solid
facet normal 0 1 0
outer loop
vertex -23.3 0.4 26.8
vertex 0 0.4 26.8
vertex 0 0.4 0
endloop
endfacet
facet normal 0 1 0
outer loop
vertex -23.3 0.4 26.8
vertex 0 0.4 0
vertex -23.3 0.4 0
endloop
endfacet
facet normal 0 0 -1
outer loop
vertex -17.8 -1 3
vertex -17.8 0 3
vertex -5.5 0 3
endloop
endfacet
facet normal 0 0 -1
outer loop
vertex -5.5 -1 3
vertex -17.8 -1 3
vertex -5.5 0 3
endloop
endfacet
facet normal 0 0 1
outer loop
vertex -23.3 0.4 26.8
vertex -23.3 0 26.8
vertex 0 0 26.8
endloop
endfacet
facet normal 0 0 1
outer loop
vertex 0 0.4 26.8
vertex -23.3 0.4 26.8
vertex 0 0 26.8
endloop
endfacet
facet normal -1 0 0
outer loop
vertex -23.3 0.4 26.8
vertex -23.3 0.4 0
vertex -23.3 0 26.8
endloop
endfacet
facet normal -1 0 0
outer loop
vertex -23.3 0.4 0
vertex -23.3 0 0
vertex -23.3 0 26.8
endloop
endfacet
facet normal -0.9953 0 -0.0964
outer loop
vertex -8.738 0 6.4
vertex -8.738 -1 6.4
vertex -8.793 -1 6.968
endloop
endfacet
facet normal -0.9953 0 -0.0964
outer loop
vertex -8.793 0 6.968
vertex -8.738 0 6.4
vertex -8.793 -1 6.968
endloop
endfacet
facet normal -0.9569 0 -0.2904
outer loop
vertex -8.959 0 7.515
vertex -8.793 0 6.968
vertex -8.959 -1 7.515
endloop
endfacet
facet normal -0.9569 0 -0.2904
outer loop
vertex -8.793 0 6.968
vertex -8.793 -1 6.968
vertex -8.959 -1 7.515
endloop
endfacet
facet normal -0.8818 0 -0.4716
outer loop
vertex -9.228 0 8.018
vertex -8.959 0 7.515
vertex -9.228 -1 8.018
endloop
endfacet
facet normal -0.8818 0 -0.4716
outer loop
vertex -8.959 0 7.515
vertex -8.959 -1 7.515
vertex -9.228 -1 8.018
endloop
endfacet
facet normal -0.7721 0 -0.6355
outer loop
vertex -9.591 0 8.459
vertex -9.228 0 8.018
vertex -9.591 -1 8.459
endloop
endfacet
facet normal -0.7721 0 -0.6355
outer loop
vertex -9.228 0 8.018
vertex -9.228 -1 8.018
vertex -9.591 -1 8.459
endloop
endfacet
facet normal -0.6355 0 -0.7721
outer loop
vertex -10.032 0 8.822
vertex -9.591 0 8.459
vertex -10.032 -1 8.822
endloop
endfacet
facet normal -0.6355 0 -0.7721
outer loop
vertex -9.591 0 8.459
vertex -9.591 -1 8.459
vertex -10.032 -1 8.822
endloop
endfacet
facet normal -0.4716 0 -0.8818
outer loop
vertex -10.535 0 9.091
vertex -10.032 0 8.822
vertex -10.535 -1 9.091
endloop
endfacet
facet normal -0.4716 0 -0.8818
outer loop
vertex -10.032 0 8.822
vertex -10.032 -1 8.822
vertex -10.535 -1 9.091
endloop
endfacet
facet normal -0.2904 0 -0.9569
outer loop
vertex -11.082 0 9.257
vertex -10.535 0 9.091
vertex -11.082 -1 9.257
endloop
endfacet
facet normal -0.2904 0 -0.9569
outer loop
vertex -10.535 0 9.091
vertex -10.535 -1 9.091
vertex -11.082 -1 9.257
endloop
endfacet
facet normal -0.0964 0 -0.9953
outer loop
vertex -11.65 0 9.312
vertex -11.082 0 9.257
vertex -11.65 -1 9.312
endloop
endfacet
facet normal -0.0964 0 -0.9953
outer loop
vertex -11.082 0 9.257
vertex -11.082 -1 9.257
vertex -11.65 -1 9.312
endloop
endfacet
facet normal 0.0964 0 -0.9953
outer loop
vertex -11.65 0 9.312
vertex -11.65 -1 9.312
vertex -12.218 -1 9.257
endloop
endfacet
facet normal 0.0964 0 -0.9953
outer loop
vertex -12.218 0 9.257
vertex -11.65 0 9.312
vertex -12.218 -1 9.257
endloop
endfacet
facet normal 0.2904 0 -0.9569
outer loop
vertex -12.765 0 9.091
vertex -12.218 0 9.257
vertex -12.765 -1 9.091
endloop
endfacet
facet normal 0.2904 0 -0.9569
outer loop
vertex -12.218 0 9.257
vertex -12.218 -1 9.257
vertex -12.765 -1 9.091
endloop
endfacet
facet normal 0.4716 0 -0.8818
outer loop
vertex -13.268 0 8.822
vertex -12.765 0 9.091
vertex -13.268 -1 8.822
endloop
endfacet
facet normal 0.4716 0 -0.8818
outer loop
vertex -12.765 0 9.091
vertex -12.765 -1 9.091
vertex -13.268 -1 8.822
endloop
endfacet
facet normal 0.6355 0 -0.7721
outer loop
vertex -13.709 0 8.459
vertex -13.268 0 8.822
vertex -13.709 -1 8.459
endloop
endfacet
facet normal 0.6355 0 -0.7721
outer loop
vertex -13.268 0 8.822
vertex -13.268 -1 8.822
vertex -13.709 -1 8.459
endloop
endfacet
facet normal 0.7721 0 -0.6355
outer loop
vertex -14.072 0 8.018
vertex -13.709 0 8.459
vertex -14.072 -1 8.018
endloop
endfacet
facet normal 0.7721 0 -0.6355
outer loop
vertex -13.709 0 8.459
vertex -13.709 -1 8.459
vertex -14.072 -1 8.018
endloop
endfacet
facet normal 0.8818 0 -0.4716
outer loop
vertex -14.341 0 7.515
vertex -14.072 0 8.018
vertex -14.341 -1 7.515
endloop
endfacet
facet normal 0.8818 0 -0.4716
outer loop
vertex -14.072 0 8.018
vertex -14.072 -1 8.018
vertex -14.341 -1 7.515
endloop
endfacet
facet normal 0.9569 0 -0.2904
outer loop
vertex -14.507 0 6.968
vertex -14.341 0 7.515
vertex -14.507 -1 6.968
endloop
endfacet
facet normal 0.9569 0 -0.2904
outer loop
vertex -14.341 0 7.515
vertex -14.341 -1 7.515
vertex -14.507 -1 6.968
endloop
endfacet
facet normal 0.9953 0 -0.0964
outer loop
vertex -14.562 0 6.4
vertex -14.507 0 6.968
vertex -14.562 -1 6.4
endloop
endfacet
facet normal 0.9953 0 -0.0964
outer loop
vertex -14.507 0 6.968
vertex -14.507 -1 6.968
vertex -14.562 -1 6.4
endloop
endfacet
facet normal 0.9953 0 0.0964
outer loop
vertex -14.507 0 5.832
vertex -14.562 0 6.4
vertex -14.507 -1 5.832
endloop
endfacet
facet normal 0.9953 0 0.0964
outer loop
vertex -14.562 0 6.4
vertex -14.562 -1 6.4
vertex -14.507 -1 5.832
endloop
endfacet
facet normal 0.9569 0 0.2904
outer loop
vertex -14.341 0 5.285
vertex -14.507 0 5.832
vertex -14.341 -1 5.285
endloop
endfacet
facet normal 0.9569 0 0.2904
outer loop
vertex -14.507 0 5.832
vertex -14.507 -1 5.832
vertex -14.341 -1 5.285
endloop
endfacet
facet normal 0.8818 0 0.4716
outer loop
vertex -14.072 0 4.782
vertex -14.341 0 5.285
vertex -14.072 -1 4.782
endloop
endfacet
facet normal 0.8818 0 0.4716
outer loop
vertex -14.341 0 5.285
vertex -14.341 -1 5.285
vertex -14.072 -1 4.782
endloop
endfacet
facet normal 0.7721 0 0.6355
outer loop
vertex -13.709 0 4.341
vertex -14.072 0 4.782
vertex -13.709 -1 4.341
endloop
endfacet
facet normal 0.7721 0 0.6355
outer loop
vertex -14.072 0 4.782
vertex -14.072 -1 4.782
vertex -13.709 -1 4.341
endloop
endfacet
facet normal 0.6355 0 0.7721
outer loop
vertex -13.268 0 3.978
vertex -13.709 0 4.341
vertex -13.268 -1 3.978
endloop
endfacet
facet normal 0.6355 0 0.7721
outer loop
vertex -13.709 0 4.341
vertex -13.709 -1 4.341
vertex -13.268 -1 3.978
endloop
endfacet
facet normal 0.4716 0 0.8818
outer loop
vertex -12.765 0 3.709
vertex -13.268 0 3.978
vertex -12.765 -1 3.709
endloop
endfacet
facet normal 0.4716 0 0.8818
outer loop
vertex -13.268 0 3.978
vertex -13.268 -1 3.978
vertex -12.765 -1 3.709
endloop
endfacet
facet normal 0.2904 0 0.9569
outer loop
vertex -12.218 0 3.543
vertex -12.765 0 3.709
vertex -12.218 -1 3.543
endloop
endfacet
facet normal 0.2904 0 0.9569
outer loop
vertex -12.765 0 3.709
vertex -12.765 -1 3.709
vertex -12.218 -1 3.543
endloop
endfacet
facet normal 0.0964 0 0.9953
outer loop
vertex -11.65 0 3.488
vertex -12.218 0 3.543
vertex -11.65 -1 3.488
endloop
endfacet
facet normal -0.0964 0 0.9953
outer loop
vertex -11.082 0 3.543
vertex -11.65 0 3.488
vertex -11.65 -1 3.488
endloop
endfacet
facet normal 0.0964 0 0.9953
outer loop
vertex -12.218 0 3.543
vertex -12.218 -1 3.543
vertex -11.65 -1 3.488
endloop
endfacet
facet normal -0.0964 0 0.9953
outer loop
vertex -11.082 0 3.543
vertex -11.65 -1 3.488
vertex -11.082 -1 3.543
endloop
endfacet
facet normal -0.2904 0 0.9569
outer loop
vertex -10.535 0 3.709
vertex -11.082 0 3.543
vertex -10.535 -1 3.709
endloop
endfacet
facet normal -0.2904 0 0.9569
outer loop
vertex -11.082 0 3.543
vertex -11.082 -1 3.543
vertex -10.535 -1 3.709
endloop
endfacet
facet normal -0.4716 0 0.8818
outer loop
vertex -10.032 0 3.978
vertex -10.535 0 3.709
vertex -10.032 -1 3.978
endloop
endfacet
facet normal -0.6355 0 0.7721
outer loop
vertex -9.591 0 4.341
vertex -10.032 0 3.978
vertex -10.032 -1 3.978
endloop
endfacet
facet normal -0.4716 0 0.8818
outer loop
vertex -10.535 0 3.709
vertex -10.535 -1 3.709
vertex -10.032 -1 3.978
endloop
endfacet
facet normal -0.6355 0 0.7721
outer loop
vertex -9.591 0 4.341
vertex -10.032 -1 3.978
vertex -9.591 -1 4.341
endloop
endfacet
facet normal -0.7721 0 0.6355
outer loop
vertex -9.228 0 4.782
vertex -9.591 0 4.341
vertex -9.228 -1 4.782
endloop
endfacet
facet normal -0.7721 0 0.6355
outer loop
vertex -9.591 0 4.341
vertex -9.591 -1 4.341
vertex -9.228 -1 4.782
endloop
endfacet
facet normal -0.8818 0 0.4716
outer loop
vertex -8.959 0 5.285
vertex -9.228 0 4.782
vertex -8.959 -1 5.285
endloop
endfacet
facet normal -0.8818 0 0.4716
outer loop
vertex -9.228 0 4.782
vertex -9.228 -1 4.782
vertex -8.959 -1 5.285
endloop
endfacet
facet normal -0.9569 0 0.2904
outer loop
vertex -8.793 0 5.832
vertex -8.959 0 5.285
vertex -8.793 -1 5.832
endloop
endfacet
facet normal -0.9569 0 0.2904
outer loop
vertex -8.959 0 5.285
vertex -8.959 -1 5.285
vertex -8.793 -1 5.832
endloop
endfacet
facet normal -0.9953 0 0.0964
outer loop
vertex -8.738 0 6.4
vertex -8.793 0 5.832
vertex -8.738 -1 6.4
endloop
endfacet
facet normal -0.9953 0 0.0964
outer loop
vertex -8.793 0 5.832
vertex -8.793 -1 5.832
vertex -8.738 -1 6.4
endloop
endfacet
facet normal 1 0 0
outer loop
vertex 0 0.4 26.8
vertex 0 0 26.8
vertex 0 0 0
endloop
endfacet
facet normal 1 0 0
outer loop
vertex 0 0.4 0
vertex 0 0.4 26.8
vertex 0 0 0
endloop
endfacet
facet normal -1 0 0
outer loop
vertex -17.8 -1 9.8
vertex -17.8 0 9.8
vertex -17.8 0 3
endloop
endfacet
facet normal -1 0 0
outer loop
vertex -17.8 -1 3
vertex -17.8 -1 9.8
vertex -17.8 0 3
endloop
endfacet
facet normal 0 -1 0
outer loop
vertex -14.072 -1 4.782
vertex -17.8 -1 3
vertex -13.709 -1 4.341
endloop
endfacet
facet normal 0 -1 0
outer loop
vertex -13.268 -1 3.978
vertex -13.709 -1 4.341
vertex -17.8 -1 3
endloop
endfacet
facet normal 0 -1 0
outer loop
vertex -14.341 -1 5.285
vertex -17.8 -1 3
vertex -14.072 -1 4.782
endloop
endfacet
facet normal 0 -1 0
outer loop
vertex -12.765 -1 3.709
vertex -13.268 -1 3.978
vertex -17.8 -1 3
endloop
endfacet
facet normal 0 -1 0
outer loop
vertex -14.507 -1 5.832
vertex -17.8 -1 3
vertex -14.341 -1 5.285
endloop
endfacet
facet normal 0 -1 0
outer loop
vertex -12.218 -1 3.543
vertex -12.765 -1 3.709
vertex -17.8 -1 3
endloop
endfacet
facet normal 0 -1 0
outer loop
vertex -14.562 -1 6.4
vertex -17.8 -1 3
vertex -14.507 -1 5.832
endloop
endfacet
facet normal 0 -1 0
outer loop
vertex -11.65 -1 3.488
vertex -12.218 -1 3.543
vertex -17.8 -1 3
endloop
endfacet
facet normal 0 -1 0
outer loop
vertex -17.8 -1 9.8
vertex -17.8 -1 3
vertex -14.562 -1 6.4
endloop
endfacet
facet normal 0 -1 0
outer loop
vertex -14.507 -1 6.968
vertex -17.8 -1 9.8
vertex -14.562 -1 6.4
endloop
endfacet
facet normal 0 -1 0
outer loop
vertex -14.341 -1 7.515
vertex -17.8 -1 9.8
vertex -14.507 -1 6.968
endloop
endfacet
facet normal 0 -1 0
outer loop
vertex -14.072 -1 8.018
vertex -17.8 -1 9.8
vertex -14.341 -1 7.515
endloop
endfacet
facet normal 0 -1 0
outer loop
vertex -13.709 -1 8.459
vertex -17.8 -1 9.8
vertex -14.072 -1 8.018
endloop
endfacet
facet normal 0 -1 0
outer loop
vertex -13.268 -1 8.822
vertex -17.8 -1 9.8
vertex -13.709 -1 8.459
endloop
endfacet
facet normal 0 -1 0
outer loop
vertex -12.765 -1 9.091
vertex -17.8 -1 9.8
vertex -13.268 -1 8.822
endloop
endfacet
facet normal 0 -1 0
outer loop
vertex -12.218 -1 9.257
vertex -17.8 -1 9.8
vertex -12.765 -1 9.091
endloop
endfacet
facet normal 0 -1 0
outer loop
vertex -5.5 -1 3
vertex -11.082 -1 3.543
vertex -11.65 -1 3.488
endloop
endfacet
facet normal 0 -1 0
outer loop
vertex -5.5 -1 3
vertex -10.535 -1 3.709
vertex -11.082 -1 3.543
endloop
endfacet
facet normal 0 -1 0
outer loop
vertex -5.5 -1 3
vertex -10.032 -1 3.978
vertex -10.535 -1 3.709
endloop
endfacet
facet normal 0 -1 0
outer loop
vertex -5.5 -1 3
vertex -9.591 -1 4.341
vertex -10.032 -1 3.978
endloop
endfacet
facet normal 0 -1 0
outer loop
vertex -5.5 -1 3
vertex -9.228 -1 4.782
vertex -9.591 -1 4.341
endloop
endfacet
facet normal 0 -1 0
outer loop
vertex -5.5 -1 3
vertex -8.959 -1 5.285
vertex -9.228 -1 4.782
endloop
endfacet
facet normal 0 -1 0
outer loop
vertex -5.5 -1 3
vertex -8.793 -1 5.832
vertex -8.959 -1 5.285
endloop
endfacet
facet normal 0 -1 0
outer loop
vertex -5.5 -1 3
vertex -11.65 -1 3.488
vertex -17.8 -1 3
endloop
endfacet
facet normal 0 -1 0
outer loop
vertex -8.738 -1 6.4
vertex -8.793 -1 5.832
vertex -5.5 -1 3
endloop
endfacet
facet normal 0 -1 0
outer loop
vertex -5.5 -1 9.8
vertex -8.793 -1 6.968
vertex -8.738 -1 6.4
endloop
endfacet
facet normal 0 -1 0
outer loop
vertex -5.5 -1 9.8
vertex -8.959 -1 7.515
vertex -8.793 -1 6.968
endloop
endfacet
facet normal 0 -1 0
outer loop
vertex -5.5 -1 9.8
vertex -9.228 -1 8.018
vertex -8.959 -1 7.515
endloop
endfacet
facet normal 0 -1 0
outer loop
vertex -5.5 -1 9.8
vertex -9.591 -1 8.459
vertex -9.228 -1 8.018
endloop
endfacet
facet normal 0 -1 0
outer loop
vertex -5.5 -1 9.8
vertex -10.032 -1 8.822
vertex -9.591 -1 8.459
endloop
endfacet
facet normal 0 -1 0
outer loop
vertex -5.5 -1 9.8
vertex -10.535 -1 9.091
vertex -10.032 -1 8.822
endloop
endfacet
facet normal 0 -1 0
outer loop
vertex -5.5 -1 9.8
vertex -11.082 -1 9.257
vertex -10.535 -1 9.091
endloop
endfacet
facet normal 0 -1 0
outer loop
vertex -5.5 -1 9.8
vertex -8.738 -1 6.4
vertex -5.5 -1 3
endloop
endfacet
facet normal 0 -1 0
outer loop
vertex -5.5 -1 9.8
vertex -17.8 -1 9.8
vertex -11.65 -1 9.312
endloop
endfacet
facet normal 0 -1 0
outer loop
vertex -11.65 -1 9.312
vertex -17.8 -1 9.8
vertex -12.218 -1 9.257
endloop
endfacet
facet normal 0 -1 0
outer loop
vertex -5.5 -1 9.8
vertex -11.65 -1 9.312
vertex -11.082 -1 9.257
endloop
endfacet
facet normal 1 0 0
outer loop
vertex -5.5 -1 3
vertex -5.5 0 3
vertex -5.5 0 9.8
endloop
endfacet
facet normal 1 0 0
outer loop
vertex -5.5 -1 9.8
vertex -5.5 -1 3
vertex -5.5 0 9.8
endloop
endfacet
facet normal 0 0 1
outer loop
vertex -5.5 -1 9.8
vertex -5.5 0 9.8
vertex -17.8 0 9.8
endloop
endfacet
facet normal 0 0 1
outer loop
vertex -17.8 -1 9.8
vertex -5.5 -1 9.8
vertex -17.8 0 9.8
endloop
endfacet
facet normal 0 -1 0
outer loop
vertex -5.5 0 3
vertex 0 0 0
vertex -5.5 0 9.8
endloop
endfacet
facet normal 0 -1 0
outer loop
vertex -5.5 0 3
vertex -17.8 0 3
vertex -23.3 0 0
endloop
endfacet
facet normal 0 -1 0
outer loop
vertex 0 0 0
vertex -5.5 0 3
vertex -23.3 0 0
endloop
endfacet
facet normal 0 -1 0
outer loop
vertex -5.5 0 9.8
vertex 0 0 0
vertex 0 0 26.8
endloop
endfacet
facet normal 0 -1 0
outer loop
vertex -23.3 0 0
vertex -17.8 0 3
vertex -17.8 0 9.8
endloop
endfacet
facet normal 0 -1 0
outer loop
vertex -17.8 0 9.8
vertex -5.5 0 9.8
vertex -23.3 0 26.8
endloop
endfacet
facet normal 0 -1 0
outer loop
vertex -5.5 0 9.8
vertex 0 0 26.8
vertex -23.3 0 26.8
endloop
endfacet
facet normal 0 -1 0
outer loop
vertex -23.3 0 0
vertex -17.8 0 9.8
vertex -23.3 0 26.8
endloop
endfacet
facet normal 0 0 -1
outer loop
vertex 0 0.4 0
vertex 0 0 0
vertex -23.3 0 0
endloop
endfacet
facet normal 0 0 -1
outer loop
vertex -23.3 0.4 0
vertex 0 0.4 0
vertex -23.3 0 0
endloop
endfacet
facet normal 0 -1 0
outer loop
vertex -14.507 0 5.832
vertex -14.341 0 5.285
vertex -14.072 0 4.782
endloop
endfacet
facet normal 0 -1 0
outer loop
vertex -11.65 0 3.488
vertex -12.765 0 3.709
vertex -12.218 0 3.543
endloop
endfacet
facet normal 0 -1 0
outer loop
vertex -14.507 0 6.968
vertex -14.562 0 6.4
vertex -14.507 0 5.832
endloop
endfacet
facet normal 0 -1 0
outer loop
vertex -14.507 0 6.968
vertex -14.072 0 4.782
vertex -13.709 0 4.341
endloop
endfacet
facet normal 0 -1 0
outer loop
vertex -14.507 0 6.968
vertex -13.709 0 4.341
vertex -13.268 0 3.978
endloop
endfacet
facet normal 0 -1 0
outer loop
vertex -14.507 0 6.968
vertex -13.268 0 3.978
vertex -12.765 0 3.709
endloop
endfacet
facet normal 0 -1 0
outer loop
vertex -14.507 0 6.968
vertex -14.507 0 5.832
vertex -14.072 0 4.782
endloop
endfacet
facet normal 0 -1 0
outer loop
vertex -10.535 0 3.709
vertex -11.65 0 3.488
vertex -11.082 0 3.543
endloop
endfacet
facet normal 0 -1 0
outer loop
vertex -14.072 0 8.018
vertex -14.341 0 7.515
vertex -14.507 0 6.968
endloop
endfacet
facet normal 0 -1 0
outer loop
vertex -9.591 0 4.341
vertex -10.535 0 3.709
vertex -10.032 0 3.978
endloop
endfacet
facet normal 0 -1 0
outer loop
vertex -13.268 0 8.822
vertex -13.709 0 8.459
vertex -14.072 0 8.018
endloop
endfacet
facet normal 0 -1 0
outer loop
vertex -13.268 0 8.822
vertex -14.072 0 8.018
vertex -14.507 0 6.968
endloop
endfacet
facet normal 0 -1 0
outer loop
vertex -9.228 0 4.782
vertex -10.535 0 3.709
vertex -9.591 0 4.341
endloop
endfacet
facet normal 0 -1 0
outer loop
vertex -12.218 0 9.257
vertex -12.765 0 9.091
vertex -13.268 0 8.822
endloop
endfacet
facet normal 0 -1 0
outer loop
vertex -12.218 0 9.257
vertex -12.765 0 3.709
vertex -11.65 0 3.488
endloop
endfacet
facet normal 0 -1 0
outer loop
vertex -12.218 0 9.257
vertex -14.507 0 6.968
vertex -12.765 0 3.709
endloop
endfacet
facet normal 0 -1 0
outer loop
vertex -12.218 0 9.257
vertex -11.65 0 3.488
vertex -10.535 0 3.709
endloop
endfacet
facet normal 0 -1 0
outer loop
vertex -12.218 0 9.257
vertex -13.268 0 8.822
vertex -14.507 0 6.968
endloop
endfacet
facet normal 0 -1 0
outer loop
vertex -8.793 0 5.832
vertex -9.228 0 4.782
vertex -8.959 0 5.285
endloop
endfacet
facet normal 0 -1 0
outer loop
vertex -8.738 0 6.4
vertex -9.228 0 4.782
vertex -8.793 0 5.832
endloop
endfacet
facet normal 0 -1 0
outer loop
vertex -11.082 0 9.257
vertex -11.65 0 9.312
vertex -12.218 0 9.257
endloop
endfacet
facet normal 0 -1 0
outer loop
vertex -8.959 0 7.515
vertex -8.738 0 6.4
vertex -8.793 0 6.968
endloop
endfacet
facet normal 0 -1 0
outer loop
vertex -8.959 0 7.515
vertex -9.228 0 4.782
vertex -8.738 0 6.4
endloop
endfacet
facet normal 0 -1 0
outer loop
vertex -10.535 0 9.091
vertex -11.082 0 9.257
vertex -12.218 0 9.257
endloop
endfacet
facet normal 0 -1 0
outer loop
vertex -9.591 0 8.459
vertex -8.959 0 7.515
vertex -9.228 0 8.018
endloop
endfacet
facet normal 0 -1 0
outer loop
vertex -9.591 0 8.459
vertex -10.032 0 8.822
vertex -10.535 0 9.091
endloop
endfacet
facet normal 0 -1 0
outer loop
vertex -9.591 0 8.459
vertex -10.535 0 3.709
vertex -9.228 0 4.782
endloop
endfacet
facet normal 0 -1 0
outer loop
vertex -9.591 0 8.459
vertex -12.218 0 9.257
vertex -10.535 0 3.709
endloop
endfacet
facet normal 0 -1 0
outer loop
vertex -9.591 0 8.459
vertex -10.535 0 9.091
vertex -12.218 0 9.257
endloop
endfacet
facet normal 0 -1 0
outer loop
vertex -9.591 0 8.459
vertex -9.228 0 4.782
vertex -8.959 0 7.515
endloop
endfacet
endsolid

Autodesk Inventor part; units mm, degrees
ref_plane "YZ Plane" through (0, 0, 0) normal (1, 0, 0) x (0, 1, 0)
ref_plane "XZ Plane" through (0, 0, 0) normal (0, 1, 0) x (-1, 0, 0)
ref_plane "XY Plane" through (0, 0, 0) normal (0, 0, 1) x (1, 0, 0)
sketch "Skizze1" plane through (0, 0, 0) normal (0, 1, 0) x (-1, 0, 0)
  line L0 (0, 0) -> (23.3, 0)
  line L1 (23.3, 0) -> (23.3, 26.8)
  line L2 (23.3, 26.8) -> (0, 26.8)
  line L3 (0, 26.8) -> (0, 0)
  dimension "d0" = 23.3
  dimension "d1" = 26.8
extrude "Extrusion1" add sketch "Skizze1" along normal blind 0.4
sketch "Skizze2" plane through (0, 0, 0) normal (0, -1, 0) x (1, 0, 0)
  line L0 (0, 0) -> (-23.3, 0) projected
  line L1 (0, 26.8) -> (0, 0) projected
  line L2 (-23.3, 26.8) -> (0, 26.8) projected
  line L3 (-23.3, 0) -> (-23.3, 26.8) projected
  line L4 (-17.8, 3) -> (-5.5, 3)
  line L5 (-5.5, 3) -> (-5.5, 9.8)
  line L6 (-5.5, 9.8) -> (-17.8, 9.8)
  line L7 (-17.8, 9.8) -> (-17.8, 3)
  dimension "d4" = 3
  dimension "d5" = 17
  dimension "d6" = 5.5
  dimension "d7" = 5.5
extrude "Extrusion2" add sketch "Skizze2" along normal blind 1 contours L7 L6 L5 L4
sketch "Skizze3" plane through (0, -1, 0) normal (0, -1, 0) x (1, 0, 0)
  line L0 (-17.8, 3) -> (-5.5, 3) projected
  line L1 (-5.5, 3) -> (-5.5, 9.8) projected
  line L2 (-5.5, 9.8) -> (-17.8, 9.8) projected
  line L3 (-17.8, 9.8) -> (-17.8, 3) projected
  circle A0 centre (-11.65, 6.4) radius 2.9125
  point P0 (0, 0)
extrude "Extrusion3" cut sketch "Skizze3" against normal blind 1 contours A0
ref_plane "Work Plane1" through (-11.65, 0, 0) normal (-1, 0, 0) x (0, 0, 1)
properties part number "02_Nanoscopy_Chip"
